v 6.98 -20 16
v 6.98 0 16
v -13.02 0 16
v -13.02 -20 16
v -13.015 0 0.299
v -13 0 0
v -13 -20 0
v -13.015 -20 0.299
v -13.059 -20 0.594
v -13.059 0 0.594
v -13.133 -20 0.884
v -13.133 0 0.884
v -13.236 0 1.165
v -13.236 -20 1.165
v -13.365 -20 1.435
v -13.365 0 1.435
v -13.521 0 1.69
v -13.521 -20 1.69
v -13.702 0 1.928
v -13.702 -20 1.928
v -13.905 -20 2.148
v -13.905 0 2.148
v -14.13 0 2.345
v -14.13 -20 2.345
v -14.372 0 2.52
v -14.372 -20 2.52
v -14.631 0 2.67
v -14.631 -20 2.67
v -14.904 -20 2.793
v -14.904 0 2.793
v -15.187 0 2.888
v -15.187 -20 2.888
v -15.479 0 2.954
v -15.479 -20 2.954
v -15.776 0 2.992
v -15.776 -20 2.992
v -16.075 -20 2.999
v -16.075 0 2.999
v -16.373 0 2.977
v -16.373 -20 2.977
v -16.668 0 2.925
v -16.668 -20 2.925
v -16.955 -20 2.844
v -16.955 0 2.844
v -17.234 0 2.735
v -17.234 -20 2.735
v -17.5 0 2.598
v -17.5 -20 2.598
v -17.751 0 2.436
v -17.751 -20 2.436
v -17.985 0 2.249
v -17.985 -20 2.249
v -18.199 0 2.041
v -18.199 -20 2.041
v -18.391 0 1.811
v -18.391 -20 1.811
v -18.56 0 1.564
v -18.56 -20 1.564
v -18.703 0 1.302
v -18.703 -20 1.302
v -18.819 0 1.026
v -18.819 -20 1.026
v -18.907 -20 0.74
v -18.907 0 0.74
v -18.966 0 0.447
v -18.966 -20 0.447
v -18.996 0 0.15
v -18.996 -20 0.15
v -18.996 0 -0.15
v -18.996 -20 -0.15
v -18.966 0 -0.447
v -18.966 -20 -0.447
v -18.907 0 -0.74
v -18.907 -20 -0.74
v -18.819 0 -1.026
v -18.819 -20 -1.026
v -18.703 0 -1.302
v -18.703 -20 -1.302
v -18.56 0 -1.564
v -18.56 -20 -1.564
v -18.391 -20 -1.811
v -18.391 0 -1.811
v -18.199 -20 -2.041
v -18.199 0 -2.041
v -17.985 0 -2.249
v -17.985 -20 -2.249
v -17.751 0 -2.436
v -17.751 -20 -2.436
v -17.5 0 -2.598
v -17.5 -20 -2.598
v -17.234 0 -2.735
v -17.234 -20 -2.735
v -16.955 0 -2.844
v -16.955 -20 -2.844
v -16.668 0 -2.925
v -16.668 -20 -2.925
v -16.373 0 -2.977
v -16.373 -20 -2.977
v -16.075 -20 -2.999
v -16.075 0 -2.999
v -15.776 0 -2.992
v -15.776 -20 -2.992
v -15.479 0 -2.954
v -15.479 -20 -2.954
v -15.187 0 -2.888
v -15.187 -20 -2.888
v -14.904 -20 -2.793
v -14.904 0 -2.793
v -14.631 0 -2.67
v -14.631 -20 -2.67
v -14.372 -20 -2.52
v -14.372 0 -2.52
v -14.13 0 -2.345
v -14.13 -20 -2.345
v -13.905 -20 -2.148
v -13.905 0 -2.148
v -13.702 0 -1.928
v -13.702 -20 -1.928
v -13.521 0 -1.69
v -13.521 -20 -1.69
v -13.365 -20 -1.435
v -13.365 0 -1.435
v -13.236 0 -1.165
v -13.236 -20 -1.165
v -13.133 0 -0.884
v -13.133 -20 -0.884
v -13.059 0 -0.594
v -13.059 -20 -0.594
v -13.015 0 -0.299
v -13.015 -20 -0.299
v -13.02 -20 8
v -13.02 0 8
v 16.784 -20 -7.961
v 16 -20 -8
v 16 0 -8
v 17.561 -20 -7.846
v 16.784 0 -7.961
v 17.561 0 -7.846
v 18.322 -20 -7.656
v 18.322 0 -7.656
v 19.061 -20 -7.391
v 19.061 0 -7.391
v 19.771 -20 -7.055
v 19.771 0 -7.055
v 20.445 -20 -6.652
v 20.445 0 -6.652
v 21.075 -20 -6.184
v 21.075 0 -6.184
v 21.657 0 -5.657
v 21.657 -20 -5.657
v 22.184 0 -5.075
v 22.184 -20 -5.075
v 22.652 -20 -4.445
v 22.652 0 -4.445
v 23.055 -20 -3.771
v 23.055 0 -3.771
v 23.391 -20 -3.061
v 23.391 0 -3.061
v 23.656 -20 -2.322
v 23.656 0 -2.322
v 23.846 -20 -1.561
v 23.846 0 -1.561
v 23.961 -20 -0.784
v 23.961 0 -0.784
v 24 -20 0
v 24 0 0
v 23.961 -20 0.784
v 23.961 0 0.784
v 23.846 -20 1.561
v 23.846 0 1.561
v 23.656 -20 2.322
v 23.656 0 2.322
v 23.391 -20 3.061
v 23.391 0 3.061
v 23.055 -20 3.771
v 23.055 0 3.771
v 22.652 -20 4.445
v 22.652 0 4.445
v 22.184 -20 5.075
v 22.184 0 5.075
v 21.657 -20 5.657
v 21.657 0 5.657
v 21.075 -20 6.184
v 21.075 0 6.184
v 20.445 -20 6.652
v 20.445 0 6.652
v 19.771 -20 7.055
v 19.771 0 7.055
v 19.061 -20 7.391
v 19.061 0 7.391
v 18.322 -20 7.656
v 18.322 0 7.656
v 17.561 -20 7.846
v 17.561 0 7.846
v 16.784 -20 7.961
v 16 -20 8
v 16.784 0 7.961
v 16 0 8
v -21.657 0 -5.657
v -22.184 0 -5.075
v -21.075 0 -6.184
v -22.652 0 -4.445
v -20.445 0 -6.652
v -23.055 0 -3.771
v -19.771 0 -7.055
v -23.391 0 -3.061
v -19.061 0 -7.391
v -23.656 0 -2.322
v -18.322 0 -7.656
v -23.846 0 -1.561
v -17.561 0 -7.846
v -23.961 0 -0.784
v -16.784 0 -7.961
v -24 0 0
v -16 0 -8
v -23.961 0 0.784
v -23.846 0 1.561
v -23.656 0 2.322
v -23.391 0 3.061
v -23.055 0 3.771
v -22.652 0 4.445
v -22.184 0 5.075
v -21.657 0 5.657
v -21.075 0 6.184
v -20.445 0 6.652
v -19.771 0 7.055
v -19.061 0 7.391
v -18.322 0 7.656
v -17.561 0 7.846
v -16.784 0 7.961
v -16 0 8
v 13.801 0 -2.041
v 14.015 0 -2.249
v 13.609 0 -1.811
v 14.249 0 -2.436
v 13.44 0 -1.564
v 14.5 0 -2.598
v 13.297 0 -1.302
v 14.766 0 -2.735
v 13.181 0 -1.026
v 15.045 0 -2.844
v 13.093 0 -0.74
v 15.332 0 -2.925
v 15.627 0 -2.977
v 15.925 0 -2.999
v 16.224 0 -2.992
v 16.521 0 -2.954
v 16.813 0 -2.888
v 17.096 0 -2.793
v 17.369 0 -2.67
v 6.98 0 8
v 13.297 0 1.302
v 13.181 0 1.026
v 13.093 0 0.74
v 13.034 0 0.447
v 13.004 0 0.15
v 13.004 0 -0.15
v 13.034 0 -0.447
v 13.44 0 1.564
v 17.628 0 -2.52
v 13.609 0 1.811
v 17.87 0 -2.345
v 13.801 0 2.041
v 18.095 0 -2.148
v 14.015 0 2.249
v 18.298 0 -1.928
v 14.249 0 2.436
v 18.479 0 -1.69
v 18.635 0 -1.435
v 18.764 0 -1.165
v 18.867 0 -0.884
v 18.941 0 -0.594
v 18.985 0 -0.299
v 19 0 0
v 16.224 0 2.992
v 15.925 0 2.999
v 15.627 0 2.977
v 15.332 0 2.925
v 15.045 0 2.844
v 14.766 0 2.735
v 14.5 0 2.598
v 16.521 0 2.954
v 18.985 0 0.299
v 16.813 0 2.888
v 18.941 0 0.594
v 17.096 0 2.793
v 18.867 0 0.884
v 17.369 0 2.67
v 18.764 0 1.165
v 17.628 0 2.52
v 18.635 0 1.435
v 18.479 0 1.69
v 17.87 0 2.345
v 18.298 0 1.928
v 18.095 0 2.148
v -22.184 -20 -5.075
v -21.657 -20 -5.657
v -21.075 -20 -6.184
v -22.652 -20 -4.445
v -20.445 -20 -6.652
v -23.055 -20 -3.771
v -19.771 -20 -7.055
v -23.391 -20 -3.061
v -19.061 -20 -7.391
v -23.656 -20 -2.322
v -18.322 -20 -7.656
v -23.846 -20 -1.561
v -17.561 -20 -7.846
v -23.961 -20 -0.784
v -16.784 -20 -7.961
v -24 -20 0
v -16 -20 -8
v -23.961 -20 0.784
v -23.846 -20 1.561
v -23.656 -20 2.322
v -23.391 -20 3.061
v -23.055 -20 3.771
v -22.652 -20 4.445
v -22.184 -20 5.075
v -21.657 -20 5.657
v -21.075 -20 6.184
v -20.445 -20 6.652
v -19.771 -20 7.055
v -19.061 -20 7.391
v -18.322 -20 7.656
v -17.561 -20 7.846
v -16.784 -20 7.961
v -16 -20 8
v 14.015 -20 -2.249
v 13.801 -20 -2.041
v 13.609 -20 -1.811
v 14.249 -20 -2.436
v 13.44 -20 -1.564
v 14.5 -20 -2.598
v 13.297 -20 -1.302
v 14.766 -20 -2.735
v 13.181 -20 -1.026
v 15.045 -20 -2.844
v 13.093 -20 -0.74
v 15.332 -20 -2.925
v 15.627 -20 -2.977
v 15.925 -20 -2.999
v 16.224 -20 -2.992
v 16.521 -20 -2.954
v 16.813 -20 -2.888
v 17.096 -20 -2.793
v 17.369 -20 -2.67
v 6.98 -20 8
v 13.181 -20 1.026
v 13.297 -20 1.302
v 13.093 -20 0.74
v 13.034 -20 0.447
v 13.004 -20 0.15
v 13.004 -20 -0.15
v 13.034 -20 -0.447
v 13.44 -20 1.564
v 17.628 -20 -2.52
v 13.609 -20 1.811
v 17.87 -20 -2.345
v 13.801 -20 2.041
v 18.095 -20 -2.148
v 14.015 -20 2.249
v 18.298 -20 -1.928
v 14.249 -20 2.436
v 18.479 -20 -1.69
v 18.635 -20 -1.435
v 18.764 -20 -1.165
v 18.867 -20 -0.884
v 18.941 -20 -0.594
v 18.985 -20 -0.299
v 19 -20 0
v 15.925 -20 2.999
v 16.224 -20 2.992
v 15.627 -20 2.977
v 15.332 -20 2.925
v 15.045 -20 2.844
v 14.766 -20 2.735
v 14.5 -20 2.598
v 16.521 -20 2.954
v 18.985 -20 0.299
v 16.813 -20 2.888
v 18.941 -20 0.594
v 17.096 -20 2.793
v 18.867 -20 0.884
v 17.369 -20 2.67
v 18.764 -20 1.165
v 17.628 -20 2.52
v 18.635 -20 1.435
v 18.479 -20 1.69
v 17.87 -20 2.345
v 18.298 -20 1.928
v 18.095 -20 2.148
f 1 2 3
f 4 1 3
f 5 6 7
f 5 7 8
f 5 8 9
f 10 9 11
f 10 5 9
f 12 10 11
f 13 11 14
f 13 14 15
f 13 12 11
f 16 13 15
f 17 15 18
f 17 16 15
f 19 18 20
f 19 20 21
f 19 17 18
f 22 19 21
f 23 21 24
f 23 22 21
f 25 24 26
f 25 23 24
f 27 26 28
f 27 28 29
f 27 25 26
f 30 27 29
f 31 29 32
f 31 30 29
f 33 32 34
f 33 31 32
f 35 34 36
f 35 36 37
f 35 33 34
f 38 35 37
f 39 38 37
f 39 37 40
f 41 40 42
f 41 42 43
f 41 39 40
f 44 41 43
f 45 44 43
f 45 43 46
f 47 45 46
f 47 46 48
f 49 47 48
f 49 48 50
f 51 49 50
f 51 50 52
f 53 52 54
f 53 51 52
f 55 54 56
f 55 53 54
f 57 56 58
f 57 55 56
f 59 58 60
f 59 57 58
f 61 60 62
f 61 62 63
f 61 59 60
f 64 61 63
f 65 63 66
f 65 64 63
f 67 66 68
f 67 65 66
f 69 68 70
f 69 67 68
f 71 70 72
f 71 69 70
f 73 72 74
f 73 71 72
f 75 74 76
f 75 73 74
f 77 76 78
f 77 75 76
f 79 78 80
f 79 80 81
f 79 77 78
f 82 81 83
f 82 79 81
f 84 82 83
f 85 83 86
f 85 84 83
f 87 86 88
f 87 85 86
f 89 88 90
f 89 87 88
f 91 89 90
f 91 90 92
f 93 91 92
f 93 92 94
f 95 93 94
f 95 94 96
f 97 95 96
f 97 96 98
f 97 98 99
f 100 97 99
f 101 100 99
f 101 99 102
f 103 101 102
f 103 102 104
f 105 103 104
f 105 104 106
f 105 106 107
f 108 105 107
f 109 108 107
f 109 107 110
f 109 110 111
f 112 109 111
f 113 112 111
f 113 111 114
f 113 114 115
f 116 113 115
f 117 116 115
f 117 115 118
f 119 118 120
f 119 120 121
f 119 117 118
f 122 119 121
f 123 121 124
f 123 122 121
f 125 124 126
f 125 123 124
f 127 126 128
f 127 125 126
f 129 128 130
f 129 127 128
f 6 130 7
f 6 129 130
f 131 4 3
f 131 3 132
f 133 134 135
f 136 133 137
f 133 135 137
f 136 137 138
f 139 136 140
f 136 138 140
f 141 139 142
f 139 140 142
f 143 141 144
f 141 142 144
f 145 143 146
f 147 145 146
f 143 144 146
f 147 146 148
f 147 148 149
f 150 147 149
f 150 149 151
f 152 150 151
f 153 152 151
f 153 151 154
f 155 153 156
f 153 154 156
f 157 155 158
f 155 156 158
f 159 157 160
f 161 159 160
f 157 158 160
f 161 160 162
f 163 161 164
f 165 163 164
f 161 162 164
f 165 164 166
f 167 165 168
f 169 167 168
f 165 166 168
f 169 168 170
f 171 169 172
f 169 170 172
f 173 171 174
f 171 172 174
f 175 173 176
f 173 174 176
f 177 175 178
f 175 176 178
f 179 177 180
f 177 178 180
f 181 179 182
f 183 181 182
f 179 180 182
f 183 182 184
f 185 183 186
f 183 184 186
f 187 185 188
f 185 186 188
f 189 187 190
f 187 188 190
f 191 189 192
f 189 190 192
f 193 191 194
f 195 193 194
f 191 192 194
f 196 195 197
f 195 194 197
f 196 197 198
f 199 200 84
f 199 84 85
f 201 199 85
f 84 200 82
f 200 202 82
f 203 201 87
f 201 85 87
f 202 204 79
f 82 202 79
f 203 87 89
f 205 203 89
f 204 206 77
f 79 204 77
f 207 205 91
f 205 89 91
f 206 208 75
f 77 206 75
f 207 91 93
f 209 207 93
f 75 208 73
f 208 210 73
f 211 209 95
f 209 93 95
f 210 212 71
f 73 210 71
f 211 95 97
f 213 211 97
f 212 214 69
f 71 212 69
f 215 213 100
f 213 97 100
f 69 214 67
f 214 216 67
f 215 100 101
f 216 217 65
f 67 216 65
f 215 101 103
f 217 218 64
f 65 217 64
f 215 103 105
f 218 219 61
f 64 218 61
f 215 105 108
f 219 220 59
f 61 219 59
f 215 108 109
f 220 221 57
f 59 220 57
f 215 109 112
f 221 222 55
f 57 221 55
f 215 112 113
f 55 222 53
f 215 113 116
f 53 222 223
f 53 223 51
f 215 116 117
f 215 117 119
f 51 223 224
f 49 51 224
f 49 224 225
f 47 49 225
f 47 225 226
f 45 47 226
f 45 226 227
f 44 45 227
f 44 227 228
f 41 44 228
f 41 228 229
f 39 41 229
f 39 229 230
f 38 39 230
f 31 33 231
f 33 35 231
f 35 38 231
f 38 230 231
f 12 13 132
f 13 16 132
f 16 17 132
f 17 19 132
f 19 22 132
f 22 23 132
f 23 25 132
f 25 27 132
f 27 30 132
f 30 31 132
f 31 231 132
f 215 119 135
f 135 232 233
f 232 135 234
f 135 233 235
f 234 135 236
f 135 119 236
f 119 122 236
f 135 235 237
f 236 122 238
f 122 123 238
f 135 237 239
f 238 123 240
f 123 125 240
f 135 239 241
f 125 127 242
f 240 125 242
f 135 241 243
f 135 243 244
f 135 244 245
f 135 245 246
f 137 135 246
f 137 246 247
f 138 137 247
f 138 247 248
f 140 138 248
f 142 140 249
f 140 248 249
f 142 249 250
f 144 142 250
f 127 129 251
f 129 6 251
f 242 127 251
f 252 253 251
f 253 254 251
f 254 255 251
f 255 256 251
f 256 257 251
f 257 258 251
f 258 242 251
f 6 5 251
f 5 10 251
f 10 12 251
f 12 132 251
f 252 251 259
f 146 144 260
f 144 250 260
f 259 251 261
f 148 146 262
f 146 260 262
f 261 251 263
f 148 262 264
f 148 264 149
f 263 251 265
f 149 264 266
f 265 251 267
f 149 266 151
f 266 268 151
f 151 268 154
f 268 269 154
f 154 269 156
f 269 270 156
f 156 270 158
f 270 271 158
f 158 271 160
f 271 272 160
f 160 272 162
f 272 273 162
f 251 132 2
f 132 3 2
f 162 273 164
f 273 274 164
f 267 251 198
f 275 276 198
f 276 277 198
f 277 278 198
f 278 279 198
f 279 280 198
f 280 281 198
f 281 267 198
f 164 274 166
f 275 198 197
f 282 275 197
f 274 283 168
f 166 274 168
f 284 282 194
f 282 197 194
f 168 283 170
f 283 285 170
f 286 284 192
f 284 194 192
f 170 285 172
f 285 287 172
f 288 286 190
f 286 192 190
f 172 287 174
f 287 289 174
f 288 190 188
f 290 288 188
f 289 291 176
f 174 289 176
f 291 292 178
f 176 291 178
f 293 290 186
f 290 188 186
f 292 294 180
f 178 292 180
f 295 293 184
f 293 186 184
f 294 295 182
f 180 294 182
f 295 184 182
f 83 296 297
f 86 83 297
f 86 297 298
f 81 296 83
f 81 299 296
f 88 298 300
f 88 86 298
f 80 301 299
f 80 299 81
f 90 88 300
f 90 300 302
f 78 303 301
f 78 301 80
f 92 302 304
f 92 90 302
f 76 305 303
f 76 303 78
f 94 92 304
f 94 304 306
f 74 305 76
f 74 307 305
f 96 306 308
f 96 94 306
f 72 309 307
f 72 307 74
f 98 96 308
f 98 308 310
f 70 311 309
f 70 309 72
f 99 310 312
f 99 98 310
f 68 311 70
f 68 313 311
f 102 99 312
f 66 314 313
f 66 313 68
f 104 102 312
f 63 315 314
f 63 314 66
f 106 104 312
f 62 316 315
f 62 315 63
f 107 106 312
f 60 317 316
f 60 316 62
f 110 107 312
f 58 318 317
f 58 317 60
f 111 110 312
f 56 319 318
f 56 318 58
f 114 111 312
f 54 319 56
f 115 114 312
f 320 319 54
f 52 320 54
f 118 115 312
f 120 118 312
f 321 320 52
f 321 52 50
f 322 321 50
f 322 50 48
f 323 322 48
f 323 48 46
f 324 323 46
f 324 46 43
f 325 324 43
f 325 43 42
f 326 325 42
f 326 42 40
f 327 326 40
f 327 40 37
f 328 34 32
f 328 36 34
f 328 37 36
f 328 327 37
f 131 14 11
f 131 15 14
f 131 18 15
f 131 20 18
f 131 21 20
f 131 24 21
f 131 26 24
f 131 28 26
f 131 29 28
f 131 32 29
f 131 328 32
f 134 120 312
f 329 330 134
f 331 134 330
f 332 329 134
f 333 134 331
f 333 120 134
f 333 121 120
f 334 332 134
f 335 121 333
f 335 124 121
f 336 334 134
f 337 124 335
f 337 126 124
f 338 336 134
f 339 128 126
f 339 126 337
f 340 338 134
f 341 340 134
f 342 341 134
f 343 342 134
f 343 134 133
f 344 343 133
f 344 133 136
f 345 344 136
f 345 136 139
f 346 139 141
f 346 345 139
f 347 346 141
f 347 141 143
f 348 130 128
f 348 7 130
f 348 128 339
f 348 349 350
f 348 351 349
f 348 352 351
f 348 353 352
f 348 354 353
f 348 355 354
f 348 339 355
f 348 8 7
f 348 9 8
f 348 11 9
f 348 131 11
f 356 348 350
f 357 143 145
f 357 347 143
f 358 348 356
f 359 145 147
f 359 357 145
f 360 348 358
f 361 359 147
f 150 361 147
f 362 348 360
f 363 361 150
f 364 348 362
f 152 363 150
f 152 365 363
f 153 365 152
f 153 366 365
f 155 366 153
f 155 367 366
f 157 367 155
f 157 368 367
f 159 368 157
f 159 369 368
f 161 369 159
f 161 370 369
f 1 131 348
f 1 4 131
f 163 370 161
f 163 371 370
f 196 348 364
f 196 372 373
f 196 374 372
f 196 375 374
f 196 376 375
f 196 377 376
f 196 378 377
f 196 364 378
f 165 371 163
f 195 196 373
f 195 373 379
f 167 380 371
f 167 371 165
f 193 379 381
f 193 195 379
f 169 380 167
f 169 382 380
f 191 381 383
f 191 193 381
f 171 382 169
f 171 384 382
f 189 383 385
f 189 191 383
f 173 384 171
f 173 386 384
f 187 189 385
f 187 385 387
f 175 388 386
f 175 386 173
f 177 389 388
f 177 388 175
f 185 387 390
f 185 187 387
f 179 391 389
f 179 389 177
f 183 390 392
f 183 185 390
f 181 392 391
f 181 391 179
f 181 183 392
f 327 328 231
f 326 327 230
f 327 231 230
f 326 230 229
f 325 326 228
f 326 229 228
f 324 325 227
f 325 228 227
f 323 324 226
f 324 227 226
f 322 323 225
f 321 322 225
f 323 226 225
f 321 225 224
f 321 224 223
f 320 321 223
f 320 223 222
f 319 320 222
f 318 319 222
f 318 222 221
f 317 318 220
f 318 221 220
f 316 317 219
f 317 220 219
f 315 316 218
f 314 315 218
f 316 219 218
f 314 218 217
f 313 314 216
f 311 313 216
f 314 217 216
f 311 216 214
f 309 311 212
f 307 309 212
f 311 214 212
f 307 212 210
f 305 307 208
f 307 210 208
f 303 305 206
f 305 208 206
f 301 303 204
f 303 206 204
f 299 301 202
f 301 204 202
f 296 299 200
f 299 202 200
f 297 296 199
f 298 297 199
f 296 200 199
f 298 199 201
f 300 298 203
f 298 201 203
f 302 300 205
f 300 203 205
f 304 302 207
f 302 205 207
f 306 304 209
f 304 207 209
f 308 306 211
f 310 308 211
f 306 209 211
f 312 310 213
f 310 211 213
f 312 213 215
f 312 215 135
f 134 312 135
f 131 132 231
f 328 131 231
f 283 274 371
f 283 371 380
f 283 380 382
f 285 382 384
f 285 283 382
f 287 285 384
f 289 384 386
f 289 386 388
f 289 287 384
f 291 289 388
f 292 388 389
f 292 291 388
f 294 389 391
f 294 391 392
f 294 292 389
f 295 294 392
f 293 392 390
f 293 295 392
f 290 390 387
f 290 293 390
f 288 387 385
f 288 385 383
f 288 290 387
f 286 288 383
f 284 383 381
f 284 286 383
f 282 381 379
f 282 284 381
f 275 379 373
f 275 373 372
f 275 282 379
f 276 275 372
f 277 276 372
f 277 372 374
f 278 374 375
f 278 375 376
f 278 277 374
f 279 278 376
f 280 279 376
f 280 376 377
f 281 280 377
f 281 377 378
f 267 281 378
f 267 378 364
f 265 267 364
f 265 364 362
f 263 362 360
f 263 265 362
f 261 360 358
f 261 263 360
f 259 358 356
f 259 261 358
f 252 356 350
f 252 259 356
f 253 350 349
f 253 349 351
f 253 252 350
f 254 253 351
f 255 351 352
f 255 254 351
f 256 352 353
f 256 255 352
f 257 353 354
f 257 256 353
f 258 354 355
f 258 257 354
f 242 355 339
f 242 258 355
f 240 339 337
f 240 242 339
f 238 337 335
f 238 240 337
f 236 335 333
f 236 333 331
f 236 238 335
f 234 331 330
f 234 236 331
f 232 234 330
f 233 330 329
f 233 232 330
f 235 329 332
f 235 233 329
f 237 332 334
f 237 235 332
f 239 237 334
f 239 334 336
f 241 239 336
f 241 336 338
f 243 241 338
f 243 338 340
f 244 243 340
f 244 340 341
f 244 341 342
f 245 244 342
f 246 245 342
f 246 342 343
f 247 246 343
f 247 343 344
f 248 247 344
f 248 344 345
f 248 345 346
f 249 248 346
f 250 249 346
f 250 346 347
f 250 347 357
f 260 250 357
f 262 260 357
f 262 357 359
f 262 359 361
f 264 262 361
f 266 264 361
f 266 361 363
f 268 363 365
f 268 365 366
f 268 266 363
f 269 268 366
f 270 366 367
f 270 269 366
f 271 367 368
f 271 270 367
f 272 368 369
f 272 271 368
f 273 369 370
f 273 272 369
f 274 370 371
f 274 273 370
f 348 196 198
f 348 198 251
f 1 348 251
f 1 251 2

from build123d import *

# Parameters (mm, degrees)
F0_R     = 3
F1_DEPTH = 20


with BuildPart() as f1:
    # F0 (on Front) → F1 (new body)
    with BuildSketch(Plane.XZ):
        with BuildLine():
            Line((-13.020127, 8), (-16, 8))
            ThreePointArc((-16, 8), (-24, 0), (-16, -8))
            Line((-16, -8), (16, -8))
            ThreePointArc((16, -8), (24, 0), (16, 8))
            Line((16, 8), (6.979873, 8))
            Line((6.979873, 8), (6.979873, 16))
            Line((6.979873, 16), (-13.020127, 16))
            Line((-13.020127, 16), (-13.020127, 8))
        make_face()
        with Locations((-16, 0)):
            Circle(F0_R, mode=Mode.SUBTRACT)
        with Locations((16, 0)):
            Circle(F0_R, mode=Mode.SUBTRACT)
    extrude(amount=F1_DEPTH)


solid = f1.part
